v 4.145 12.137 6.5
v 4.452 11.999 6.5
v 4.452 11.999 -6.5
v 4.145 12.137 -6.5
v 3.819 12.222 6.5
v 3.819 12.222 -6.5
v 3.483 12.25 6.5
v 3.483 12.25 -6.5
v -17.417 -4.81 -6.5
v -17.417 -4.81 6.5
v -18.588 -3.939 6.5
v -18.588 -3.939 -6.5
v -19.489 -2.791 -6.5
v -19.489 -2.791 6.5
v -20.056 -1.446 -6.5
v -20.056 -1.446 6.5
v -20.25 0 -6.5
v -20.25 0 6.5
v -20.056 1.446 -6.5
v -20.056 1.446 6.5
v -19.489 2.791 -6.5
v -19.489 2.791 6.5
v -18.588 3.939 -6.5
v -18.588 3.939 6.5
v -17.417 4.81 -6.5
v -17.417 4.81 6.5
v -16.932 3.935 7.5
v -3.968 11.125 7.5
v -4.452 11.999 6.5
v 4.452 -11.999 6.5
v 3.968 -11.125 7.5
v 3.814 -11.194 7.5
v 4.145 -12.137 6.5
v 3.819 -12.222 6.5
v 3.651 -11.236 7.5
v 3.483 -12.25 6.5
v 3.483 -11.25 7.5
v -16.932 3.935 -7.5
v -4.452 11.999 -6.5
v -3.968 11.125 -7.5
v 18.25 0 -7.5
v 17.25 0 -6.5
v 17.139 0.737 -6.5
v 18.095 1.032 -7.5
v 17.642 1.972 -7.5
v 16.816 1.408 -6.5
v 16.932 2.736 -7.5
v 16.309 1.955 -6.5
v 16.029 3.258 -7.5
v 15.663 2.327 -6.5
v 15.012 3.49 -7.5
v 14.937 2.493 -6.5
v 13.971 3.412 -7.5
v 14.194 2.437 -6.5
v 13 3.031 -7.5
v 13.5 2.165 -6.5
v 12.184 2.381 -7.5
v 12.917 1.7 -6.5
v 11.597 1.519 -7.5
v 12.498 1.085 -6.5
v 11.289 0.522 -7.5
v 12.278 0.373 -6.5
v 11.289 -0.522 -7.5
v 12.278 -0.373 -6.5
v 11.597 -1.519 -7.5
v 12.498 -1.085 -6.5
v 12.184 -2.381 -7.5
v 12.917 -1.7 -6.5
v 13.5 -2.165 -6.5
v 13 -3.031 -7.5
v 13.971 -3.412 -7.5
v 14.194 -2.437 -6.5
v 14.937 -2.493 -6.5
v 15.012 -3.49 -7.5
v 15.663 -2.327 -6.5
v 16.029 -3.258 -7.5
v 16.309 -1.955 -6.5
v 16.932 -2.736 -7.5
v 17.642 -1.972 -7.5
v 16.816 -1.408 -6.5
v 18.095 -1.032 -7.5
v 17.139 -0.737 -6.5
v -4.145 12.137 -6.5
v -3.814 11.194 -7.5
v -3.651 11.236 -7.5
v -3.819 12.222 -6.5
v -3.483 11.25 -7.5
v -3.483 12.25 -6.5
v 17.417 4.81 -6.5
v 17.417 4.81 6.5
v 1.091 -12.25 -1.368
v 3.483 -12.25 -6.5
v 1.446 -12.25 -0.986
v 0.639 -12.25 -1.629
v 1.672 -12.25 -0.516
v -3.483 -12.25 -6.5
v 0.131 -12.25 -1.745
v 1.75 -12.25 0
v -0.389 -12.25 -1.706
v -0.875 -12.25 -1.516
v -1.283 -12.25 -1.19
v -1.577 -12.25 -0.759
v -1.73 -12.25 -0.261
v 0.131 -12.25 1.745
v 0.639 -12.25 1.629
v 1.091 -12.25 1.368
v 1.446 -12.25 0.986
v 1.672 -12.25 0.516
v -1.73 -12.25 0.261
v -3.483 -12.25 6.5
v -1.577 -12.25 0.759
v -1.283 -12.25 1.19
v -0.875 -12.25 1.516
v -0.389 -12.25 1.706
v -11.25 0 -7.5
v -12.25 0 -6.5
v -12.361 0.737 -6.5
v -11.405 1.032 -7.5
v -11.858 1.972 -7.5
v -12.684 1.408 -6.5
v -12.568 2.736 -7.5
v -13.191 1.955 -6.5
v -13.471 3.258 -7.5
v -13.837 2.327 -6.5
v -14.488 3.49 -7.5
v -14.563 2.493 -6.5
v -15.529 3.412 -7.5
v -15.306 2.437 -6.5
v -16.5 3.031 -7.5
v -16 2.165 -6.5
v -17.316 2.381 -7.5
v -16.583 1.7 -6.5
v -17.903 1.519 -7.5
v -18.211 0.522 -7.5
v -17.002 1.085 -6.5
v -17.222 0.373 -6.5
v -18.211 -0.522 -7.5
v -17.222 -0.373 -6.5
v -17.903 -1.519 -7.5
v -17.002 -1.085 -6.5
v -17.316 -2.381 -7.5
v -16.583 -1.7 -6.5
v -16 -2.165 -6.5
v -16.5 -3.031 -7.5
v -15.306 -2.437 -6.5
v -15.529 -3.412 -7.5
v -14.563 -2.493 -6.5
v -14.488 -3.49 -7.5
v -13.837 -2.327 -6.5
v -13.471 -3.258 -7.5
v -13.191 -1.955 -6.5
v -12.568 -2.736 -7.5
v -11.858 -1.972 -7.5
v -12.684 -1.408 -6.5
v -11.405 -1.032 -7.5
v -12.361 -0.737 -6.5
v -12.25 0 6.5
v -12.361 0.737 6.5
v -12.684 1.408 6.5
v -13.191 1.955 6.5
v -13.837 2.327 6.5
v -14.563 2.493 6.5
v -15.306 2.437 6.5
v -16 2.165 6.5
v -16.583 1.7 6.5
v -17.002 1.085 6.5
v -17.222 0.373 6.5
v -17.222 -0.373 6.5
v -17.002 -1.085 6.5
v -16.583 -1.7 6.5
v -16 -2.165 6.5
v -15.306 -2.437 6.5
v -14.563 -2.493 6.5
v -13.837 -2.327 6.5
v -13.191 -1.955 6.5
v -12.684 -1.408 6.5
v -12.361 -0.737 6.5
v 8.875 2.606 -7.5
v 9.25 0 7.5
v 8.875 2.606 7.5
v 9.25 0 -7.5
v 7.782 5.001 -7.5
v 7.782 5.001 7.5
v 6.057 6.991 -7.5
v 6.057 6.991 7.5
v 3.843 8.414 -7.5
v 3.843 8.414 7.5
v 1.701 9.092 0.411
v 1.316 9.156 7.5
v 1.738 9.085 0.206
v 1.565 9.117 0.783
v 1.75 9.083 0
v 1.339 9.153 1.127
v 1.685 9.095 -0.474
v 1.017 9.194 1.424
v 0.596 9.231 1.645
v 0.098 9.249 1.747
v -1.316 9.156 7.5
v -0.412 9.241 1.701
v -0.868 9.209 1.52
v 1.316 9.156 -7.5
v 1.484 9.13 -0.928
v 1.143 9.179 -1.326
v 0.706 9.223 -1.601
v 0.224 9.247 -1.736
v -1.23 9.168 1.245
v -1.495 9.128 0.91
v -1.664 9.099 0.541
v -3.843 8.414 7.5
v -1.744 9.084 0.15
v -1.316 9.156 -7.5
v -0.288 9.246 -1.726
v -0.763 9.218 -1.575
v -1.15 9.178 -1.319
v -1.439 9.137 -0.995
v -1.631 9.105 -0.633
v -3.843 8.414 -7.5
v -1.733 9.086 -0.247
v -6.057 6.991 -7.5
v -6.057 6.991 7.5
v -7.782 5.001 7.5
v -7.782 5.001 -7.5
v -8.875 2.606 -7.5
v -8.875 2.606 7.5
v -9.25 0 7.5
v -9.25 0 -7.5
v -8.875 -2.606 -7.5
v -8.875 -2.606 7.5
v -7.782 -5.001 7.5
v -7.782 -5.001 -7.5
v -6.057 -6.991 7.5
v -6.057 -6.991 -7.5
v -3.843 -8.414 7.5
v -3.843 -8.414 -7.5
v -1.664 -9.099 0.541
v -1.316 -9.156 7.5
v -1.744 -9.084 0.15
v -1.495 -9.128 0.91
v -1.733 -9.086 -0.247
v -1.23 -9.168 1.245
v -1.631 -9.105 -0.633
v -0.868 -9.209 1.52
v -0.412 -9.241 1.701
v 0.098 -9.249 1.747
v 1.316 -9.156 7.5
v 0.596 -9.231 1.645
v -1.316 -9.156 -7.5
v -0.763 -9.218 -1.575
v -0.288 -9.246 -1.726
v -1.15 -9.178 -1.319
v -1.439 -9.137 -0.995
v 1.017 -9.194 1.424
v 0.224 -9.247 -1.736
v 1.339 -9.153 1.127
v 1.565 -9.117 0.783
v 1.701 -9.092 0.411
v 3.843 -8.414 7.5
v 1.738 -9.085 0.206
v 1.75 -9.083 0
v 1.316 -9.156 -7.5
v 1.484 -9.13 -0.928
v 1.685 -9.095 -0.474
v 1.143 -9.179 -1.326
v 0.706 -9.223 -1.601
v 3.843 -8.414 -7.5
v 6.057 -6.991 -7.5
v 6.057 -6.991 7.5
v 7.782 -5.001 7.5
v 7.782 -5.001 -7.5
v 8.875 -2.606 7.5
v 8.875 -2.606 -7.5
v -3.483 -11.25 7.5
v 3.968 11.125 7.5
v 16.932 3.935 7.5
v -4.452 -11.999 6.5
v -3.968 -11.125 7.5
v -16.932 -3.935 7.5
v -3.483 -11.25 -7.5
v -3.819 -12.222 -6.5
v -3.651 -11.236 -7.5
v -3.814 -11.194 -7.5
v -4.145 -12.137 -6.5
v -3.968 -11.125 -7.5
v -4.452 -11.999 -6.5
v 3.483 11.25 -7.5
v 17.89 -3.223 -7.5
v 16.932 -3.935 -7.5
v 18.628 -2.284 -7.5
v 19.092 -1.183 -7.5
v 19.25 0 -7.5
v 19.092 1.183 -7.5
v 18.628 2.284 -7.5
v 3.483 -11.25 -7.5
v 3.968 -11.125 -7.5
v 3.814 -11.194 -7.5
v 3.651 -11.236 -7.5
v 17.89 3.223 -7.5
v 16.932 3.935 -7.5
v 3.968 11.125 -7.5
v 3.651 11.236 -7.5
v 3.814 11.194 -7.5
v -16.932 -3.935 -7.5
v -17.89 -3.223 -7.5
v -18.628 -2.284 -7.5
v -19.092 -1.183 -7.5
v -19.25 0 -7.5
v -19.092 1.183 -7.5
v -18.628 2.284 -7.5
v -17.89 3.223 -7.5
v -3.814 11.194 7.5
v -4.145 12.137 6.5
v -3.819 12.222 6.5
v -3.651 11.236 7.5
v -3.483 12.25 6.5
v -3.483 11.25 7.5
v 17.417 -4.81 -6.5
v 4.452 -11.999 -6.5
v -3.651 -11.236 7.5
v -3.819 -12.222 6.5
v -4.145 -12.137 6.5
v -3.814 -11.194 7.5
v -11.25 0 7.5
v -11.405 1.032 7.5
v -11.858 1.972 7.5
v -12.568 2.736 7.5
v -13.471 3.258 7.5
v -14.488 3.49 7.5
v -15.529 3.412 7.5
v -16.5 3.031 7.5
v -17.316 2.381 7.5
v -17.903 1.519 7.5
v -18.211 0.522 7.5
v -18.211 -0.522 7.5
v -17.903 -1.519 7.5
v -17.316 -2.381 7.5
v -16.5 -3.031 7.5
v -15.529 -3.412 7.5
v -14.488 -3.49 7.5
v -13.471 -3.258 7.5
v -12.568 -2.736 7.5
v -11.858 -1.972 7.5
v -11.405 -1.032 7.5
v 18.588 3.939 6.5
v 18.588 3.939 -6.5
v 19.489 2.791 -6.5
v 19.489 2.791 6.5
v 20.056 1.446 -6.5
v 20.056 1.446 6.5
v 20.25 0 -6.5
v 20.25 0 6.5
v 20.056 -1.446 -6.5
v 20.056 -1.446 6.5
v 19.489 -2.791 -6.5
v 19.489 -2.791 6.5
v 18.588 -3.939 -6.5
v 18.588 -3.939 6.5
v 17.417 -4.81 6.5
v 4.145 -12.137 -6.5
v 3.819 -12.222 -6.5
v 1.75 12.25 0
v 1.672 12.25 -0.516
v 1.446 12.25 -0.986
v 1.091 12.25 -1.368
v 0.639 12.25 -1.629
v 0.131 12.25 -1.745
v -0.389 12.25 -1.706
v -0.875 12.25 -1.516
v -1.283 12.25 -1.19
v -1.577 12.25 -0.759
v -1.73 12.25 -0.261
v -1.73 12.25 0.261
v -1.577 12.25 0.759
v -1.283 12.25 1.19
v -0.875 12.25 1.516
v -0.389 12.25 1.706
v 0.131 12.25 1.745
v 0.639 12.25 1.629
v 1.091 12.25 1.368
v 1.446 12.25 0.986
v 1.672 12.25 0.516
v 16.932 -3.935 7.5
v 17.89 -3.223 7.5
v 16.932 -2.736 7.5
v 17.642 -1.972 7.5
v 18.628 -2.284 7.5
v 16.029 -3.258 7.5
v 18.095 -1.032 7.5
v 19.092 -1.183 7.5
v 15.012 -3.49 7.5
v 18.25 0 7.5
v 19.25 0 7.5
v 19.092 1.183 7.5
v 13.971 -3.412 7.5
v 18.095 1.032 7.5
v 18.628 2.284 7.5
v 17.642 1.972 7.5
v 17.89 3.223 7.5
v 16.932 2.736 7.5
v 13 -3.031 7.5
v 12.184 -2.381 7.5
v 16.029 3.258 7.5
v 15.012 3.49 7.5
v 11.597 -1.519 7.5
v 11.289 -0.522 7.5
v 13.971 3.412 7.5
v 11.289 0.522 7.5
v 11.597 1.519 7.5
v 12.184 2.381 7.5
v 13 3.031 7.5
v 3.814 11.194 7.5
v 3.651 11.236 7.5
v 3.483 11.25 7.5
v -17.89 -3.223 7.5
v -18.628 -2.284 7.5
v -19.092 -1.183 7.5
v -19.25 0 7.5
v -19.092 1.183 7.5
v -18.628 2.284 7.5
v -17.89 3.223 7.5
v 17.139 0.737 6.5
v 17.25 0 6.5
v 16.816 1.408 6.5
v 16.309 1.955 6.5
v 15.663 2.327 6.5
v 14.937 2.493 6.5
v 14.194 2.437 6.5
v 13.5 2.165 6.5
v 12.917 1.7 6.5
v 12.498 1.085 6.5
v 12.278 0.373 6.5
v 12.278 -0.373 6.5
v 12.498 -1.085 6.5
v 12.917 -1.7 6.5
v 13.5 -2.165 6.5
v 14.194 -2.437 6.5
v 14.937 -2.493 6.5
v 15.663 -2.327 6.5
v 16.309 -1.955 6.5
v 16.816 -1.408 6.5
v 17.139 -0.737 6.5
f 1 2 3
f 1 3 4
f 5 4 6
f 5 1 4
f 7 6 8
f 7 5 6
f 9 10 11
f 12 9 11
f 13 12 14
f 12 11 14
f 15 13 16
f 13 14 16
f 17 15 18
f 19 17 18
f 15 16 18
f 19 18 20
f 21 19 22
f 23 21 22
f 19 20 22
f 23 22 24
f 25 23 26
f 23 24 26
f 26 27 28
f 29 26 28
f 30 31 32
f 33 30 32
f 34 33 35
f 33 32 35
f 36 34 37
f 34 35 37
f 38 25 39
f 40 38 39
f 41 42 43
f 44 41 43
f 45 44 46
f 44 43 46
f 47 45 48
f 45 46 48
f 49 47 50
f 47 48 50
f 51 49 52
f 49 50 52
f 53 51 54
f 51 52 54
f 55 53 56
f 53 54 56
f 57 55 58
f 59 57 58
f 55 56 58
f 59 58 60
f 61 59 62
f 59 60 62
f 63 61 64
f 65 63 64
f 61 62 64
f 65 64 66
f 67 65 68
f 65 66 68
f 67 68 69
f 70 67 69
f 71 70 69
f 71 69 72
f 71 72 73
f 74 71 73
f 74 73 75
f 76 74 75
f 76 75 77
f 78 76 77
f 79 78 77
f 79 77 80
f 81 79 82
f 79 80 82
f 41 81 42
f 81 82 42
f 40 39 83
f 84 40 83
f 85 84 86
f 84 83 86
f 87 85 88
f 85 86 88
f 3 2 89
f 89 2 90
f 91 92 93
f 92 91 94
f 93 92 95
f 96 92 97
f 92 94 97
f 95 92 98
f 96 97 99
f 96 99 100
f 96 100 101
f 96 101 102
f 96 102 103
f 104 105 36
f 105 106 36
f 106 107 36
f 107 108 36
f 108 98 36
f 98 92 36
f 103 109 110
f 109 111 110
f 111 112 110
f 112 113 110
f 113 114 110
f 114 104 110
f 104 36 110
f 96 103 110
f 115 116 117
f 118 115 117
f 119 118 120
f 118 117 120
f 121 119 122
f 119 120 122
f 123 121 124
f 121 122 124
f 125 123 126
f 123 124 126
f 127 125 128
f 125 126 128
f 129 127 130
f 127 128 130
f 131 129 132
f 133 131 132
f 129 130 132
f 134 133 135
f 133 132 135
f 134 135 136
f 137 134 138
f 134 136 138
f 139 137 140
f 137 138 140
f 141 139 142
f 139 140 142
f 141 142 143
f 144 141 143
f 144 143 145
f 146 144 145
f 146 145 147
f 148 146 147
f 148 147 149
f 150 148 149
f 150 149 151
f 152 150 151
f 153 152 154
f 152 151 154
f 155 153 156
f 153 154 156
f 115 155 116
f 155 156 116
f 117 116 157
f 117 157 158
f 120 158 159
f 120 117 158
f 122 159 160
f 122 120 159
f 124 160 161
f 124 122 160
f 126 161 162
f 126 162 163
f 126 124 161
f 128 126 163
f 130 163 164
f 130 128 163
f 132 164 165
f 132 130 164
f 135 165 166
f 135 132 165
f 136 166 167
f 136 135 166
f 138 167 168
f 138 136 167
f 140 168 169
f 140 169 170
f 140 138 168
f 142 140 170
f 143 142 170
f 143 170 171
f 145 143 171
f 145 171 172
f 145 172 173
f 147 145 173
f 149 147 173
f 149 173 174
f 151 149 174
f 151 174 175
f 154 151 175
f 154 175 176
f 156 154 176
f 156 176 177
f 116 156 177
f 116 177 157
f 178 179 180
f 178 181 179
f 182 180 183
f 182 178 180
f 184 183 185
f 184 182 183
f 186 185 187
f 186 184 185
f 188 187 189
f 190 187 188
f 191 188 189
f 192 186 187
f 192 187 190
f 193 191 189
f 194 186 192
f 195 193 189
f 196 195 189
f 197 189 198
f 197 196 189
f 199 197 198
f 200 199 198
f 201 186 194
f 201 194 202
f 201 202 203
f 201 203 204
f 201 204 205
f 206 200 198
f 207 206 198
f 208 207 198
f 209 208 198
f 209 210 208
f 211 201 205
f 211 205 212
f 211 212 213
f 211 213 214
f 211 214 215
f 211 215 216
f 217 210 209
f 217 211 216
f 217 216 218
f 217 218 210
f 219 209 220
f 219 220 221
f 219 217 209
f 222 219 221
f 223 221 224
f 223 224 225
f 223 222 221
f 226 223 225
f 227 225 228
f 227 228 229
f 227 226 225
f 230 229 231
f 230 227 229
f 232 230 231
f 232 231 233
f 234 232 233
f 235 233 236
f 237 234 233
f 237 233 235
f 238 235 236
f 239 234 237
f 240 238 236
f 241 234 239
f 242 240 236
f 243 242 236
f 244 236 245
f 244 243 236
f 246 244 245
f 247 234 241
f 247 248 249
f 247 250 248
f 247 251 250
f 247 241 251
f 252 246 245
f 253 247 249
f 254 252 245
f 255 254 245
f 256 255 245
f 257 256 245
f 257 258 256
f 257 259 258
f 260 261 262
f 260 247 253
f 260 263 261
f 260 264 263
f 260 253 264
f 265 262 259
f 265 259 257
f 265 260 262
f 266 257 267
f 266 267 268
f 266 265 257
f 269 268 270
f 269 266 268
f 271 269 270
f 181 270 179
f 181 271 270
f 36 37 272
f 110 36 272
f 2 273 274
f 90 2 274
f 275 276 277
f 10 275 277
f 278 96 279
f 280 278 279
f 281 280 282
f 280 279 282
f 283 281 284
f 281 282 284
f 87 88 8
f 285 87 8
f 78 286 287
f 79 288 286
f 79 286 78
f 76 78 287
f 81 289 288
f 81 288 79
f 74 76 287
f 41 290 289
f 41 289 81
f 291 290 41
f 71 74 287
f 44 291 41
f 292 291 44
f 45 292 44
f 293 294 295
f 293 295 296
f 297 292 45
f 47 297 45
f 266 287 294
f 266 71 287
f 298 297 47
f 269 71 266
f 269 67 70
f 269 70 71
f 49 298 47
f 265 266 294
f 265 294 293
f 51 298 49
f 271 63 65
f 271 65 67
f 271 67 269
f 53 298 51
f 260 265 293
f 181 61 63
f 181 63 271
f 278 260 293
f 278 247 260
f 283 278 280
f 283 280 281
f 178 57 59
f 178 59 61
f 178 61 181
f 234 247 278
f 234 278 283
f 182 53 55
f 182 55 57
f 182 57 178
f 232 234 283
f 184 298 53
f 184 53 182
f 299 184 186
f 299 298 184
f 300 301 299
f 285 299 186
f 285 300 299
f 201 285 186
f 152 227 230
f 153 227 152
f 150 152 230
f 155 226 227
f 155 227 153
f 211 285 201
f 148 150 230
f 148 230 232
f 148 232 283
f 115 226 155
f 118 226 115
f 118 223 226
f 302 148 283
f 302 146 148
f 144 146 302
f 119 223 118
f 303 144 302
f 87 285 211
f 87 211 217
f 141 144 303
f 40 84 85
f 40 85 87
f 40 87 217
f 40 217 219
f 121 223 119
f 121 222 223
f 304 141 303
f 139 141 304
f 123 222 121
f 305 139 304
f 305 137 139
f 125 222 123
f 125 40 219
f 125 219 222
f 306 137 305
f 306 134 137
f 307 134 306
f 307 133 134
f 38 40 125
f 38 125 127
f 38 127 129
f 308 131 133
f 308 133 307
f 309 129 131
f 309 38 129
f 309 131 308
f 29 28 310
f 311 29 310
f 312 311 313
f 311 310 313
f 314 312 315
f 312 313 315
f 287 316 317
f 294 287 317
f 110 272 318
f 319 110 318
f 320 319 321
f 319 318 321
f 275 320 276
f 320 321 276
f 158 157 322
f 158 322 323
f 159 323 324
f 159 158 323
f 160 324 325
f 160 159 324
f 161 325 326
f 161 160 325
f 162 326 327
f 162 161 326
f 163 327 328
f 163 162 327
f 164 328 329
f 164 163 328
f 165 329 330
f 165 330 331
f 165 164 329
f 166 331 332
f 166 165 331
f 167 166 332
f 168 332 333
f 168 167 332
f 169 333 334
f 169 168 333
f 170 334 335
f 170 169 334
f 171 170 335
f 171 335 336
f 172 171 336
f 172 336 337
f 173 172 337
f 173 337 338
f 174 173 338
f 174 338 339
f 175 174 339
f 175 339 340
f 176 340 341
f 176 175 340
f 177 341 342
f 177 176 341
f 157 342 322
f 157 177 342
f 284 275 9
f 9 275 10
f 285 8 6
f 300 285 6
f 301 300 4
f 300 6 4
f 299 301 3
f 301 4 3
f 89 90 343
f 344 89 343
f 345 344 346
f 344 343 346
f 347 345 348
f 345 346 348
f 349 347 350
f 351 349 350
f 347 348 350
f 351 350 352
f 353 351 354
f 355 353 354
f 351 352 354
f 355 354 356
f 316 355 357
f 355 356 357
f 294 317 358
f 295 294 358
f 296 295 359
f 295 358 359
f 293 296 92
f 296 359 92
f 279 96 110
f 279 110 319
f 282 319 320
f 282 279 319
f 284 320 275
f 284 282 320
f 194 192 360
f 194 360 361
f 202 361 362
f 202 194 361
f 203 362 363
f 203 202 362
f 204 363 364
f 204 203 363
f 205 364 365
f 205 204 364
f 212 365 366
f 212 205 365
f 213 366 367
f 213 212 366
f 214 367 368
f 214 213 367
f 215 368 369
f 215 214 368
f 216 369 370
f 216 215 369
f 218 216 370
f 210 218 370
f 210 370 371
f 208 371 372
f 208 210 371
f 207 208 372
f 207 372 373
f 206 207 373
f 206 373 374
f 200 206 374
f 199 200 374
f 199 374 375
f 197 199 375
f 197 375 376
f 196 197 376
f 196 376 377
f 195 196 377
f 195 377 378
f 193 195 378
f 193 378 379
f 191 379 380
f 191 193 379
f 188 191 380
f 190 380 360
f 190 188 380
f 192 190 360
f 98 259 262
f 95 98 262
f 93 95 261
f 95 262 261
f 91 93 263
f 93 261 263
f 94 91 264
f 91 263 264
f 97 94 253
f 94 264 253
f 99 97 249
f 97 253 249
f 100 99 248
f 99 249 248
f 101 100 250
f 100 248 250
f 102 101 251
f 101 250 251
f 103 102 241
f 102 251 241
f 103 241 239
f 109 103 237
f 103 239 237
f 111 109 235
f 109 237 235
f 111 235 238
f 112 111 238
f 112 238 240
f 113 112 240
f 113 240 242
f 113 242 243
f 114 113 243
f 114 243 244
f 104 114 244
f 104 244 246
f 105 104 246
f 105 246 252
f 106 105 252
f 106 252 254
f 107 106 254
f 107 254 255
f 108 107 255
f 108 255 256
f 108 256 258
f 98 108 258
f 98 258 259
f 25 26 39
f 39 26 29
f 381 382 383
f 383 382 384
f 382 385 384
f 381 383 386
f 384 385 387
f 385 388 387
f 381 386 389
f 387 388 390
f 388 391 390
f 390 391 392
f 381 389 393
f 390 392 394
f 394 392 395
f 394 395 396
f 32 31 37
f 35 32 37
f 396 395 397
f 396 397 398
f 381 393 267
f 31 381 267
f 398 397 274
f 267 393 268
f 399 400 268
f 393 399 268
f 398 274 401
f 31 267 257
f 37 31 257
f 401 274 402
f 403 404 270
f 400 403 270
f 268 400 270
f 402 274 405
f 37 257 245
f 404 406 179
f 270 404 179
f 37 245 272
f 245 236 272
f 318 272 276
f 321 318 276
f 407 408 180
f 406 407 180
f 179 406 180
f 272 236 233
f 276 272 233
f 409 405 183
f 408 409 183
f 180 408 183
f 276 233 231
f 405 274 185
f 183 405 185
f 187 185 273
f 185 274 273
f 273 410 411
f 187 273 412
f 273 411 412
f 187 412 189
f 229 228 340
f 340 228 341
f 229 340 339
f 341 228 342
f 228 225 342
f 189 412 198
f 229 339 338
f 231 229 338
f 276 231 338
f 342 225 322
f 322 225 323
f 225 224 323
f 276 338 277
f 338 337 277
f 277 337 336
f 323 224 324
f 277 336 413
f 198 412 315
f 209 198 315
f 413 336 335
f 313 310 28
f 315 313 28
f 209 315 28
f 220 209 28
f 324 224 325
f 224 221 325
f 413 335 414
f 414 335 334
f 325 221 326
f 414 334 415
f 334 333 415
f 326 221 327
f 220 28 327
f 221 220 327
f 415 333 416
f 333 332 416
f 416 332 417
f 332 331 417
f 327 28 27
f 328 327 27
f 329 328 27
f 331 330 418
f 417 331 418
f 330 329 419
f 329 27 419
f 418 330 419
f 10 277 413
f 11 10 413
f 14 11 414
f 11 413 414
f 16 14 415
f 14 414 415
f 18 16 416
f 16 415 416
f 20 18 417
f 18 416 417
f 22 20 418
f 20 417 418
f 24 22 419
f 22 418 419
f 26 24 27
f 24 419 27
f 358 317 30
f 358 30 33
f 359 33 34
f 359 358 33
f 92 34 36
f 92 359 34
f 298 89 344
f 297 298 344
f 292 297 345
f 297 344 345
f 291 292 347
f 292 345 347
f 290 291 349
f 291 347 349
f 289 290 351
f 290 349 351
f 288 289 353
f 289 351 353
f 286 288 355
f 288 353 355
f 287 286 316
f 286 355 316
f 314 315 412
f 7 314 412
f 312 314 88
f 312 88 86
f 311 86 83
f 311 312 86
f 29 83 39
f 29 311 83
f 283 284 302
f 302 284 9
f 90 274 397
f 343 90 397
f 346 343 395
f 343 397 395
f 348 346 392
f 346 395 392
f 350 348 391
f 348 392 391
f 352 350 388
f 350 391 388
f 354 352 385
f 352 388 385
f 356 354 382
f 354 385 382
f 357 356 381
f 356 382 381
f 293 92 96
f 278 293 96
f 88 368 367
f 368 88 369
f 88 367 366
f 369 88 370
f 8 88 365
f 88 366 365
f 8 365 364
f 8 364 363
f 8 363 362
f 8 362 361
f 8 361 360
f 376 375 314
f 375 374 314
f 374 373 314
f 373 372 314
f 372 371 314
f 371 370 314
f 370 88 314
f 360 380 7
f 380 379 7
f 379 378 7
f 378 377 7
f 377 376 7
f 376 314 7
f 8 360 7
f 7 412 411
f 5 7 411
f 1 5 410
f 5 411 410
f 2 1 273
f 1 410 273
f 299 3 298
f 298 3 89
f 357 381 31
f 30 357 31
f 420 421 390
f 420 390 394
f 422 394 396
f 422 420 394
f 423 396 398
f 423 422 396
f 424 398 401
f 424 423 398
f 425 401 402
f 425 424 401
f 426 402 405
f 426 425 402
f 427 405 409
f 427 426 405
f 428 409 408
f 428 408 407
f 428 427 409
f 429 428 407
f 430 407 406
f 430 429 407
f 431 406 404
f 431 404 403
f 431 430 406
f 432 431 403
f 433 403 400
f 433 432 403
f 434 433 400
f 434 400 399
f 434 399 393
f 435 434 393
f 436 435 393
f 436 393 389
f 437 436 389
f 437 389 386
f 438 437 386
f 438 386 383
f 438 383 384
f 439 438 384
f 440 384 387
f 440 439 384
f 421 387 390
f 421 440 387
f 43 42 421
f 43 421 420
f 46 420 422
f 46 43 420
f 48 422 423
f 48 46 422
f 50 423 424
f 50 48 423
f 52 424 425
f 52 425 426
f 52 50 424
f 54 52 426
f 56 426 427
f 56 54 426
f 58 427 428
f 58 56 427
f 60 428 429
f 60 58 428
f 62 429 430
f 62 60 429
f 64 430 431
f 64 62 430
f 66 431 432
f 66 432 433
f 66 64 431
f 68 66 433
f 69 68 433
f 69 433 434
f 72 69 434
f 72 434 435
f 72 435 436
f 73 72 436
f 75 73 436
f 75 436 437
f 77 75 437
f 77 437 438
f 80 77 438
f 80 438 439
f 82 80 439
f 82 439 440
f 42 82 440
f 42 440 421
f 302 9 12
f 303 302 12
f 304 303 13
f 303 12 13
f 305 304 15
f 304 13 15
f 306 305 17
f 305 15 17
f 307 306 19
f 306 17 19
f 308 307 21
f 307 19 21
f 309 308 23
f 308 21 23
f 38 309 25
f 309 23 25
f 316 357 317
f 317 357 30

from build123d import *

# Parameters (mm, degrees)
SKETCH_1_R               = 9.25
SKETCH_1_R_2             = 2.5
EXTRUDE_1_DEPTH          = 7.5
SKETCH_3_R               = 1.75
CUT_EXTRUDE_1_DEPTH      = 13.25
CUT_EXTRUDE_1_DEPTH_BACK = 13.25
CHAMFER_1_SIZE           = 1
FILLET_1_R               = 2
CHAMFER_2_SIZE           = 1


with BuildPart() as part:
    # ｽｹｯﾁ1 → ﾎﾞｽ - 押し出し1 (new body, symmetric)
    with BuildSketch(Plane.XY):
        with BuildLine():
            Line((4, 12.25), (17.417201647, 4.809993282))
            ThreePointArc((17.417201647, 4.809993282), (20.25, 0), (17.417201647, -4.809993282))
            Line((17.417201647, -4.809993282), (4, -12.25))
            Line((4, -12.25), (-4, -12.25))
            Line((-4, -12.25), (-17.417201647, -4.809993282))
            ThreePointArc((-17.417201647, -4.809993282), (-20.25, 0), (-17.417201647, 4.809993282))
            Line((-17.417201647, 4.809993282), (-4, 12.25))
            Line((-4, 12.25), (4, 12.25))
        make_face()
        Circle(SKETCH_1_R, mode=Mode.SUBTRACT)
        with Locations((14.75, 0)):
            Circle(SKETCH_1_R_2, mode=Mode.SUBTRACT)
        with Locations((-14.75, 0)):
            Circle(SKETCH_1_R_2, mode=Mode.SUBTRACT)
    extrude(amount=EXTRUDE_1_DEPTH, both=True)

    # ｽｹｯﾁ3 → ｶｯﾄ - 押し出し1 (cut, two sides)
    with BuildSketch(Plane(origin=(0, 0, 0), x_dir=(1, 0, 0), z_dir=(0, 1, 0))) as cut_extrude_1_sk:
        Circle(SKETCH_3_R)
    extrude(amount=CUT_EXTRUDE_1_DEPTH, mode=Mode.SUBTRACT)
    extrude(cut_extrude_1_sk.sketch, amount=-CUT_EXTRUDE_1_DEPTH_BACK, mode=Mode.SUBTRACT)

    # 面取り1
    chamfer_1_edges = [part.edges().sort_by_distance(p)[0] for p in [
        (12.25, 0, -7.5),
        (12.25, 0, 7.5),
        (-17.25, 0, -7.5),
        (-17.25, 0, 7.5),
    ]]
    chamfer(chamfer_1_edges, length=CHAMFER_1_SIZE)

    # ﾌｨﾚｯﾄ1
    fillet_1_edges = [part.edges().sort_by_distance(p)[0] for p in [
        (4, -12.25, 0),
        (-4, -12.25, 0),
        (-4, 12.25, 0),
        (4, 12.25, 0),
    ]]
    fillet(fillet_1_edges, radius=FILLET_1_R)

    # 面取り2
    chamfer_2_edges = [part.edges().sort_by_distance(p)[0] for p in [
        (10.934845958, 8.404540874, -7.5),
        (20.25, 0, -7.5),
        (-20.25, 0, 7.5),
        (-10.934845958, -8.404540874, 7.5),
        (20.25, 0, 7.5),
        (10.934845958, -8.404540874, -7.5),
        (10.934845958, -8.404540874, 7.5),
        (0, -12.25, -7.5),
        (-10.934845958, 8.404540874, -7.5),
        (0, 12.25, -7.5),
        (-3.983509466, 12.186256302, -7.5),
        (3.983509466, 12.186256302, -7.5),
        (-3.983509466, -12.186256302, -7.5),
        (3.983509466, -12.186256302, -7.5),
        (0, -12.25, 7.5),
        (0, 12.25, 7.5),
        (-10.934845958, 8.404540874, 7.5),
        (-3.983509466, 12.186256302, 7.5),
        (3.983509466, 12.186256302, 7.5),
        (-3.983509466, -12.186256302, 7.5),
        (3.983509466, -12.186256302, 7.5),
        (10.934845958, 8.404540874, 7.5),
        (-10.934845958, -8.404540874, -7.5),
        (-20.25, 0, -7.5),
    ]]
    chamfer(chamfer_2_edges, length=CHAMFER_2_SIZE)


solid = part.part
